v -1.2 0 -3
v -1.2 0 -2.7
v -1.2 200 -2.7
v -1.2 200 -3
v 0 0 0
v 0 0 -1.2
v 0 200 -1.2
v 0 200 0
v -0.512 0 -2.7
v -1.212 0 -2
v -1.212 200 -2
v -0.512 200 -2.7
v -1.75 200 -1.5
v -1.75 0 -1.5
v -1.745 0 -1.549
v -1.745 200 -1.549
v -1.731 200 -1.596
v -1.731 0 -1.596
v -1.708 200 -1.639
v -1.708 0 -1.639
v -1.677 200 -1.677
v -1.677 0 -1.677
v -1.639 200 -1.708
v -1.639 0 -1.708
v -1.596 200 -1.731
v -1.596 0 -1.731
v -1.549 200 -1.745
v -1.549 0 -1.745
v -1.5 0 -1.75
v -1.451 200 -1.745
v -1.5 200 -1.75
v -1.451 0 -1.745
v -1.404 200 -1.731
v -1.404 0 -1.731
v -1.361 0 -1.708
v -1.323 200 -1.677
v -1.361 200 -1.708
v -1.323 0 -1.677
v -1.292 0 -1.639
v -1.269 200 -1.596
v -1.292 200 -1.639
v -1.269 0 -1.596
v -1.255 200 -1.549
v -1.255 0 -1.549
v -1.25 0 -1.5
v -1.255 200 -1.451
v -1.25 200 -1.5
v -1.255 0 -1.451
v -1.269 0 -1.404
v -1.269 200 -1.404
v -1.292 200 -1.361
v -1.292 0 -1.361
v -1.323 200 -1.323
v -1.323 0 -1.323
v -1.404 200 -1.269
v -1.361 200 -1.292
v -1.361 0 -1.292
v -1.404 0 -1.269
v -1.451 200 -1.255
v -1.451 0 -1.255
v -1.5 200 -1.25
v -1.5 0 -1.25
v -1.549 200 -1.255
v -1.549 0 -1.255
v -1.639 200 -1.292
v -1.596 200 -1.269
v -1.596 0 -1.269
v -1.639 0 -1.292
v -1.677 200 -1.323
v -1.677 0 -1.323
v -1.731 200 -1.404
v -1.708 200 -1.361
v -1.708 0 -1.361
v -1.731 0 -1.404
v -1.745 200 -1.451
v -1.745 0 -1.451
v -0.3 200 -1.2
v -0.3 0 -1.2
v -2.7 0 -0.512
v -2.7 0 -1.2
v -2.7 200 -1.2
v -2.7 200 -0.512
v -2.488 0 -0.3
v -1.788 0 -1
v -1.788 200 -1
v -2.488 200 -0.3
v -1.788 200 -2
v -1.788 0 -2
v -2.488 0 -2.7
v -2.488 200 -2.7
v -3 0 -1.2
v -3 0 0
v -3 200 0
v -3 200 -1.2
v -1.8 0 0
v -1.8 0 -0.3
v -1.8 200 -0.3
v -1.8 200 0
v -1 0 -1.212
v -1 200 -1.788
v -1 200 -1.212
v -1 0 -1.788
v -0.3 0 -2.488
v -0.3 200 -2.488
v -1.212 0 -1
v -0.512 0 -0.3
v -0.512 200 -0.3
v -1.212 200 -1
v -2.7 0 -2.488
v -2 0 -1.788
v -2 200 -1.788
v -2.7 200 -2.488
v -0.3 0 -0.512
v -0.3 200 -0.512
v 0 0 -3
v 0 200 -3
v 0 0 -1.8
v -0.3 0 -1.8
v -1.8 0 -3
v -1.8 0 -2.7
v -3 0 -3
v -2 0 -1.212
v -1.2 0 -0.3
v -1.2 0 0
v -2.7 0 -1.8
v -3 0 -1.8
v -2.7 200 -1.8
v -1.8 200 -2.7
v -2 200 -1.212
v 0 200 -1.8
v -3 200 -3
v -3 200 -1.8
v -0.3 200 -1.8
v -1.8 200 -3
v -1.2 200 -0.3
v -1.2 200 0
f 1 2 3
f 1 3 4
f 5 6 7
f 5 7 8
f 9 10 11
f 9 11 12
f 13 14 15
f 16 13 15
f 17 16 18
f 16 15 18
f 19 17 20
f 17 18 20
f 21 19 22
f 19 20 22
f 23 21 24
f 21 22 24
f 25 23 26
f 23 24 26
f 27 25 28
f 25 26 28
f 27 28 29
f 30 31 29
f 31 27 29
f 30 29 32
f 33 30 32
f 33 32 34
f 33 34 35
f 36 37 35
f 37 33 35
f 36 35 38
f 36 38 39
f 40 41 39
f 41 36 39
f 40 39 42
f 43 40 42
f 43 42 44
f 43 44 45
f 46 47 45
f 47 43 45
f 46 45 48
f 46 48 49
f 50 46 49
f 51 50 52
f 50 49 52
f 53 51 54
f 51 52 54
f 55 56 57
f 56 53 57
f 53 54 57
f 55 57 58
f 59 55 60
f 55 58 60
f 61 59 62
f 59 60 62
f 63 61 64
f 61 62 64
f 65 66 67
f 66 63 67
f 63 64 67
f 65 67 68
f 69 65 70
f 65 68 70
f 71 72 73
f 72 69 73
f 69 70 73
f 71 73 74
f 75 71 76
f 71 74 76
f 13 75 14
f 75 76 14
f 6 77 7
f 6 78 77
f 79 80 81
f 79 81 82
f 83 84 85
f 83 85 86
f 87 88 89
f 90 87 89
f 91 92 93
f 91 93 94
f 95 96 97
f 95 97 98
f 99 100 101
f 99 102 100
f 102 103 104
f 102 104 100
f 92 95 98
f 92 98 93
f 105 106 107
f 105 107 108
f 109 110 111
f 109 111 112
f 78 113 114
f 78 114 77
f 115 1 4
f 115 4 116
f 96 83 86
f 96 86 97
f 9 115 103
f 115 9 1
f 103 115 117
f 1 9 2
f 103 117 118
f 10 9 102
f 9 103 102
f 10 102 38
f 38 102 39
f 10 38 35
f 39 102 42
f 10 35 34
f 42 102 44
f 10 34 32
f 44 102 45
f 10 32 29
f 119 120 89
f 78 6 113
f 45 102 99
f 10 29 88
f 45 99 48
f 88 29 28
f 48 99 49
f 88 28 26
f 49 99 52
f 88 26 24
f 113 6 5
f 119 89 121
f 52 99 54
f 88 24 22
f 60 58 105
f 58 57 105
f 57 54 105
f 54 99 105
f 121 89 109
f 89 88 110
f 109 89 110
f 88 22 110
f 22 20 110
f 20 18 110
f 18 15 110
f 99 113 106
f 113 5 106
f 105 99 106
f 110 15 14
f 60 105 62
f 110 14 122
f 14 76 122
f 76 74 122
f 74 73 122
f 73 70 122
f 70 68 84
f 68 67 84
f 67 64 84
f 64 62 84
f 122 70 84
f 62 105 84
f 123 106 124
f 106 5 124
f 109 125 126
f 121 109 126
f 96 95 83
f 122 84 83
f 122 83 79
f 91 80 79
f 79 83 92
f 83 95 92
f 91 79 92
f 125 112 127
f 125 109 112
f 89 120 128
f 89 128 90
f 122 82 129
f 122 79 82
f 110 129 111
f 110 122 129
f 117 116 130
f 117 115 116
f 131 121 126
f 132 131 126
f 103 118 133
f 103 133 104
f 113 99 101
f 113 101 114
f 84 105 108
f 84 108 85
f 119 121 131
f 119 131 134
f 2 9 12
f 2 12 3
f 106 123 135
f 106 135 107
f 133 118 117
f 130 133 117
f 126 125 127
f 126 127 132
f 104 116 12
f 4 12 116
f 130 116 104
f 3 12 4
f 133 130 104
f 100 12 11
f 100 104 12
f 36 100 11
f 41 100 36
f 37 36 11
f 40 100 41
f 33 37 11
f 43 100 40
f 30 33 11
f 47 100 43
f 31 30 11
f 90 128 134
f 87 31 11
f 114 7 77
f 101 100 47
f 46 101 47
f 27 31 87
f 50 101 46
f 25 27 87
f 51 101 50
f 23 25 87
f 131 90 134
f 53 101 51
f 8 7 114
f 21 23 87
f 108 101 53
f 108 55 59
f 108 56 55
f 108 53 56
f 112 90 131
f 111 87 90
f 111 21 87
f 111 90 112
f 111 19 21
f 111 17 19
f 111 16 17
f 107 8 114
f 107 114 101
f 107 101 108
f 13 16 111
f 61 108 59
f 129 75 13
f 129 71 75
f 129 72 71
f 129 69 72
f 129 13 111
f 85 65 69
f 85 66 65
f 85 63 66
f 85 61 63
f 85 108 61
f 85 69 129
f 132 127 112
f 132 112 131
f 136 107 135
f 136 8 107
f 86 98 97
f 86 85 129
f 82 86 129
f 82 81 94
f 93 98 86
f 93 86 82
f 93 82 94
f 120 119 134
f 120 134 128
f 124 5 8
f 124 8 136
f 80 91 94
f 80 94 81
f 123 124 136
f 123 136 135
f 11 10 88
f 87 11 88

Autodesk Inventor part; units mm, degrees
ref_plane "YZ Plane" through (0, 0, 0) normal (1, 0, 0) x (0, 1, 0)
ref_plane "XZ Plane" through (0, 0, 0) normal (0, 1, 0) x (-1, 0, 0)
ref_plane "XY Plane" through (0, 0, 0) normal (0, 0, 1) x (1, 0, 0)
sketch "Skizze1" plane through (0, 0, 0) normal (0, 1, 0) x (-1, 0, 0)
  line L0 (0, 0) -> (3, 0) construction
  line L1 (3, 0) -> (3, -3) construction
  line L2 (3, -3) -> (0, -3) construction
  line L3 (0, -3) -> (0, 0) construction
  line L4 (3, -1.5) -> (0, -1.5) construction
  line L5 (1.5, -3) -> (1.5, 0) construction
  circle A0 centre (1.5, -1.5) radius 0.25
  line L6 (2, -1) -> (1, -1) construction
  line L7 (1, -1) -> (1, -2) construction
  line L8 (1, -2) -> (2, -2) construction
  line L9 (2, -2) -> (2, -1) construction
  line L10 (1.5, -1) -> (1.5, -2) construction
  line L11 (2, -1.5) -> (1, -1.5) construction
  line L12 (3, -1.2) -> (0, -1.2) construction
  line L13 (1.2, 0) -> (1.2, -3) construction
  line L14 (0, -1.8) -> (3, -1.8) construction
  line L15 (1.8, 0) -> (1.8, -3) construction
  line L16 (2.7, -2.7) -> (2.7, -0.3) construction
  line L17 (2.7, -0.3) -> (0.3, -0.3) construction
  line L18 (0.3, -0.3) -> (0.3, -2.7) construction
  line L19 (0.3, -2.7) -> (2.7, -2.7) construction
  line L20 (2.7, -0.3) -> (0.3, -2.7) construction
  line L21 (2.7, -2.7) -> (0.3, -0.3) construction
  line L22 (2.7, -0.5121) -> (0.5121, -2.7) construction
  line L23 (0.3, -2.4879) -> (2.4879, -0.3) construction
  line L24 (0.5121, -0.3) -> (2.7, -2.4879) construction
  line L25 (2.4879, -2.7) -> (0.3, -0.5121) construction
  line L26 (3, 0) -> (3, -1.2)
  line L27 (3, -1.2) -> (2.7, -1.2)
  line L28 (2.7, -1.2) -> (2.7, -0.5121)
  line L29 (2.7, -0.5121) -> (2, -1.2121)
  line L30 (2, -1.2121) -> (2, -1.7879)
  line L31 (2, -1.7879) -> (2.7, -2.4879)
  line L32 (2.7, -2.4879) -> (2.7, -1.8)
  line L33 (2.7, -1.8) -> (3, -1.8)
  line L34 (3, -3) -> (3, -1.8)
  line L35 (3, -3) -> (1.8, -3)
  line L36 (1.8, -3) -> (1.8, -2.7)
  line L37 (1.8, -2.7) -> (2.4879, -2.7)
  line L38 (1.7879, -2) -> (2.4879, -2.7)
  line L39 (1.2121, -2) -> (1.7879, -2)
  line L40 (1.2121, -2) -> (0.5121, -2.7)
  line L41 (0.5121, -2.7) -> (1.2, -2.7)
  line L42 (1.2, -2.7) -> (1.2, -3)
  line L43 (1.2, -3) -> (0, -3)
  line L44 (0, -3) -> (0, -1.8)
  line L45 (0.3, -1.8) -> (0, -1.8)
  line L46 (0.3, -1.8) -> (0.3, -2.4879)
  line L47 (0.3, -2.4879) -> (1, -1.7879)
  line L48 (1, -1.7879) -> (1, -1.2121)
  line L49 (1, -1.2121) -> (0.3, -0.5121)
  line L50 (0.3, -0.5121) -> (0.3, -1.2)
  line L51 (0.3, -1.2) -> (0, -1.2)
  line L52 (0, -1.2) -> (0, 0)
  line L53 (0, 0) -> (1.2, 0)
  line L54 (1.2, 0) -> (1.2, -0.3)
  line L55 (1.2, -0.3) -> (0.5121, -0.3)
  line L56 (0.5121, -0.3) -> (1.2121, -1)
  line L57 (1.2121, -1) -> (1.7879, -1)
  line L58 (1.7879, -1) -> (2.4879, -0.3)
  line L59 (2.4879, -0.3) -> (1.8, -0.3)
  line L60 (1.8, -0.3) -> (1.8, 0)
  line L61 (1.8, 0) -> (3, 0)
  dimension "d0" = 3
  dimension "d1" = 3
  dimension "d2" = 0.5
  dimension "d3" = 1
  dimension "d4" = 1
  dimension "d5" = 1.2
  dimension "d6" = 1.2
  dimension "d7" = 1.2
  dimension "d8" = 1.2
  dimension "d9" = 0.3
  dimension "d10" = 0.15
  dimension "d11" = 0.15
  dimension "d12" = 0.15
  dimension "d13" = 0.15
extrude "Extrusion1" add sketch "Skizze1" along normal blind 200
properties part number "item_30x30_200cm"
